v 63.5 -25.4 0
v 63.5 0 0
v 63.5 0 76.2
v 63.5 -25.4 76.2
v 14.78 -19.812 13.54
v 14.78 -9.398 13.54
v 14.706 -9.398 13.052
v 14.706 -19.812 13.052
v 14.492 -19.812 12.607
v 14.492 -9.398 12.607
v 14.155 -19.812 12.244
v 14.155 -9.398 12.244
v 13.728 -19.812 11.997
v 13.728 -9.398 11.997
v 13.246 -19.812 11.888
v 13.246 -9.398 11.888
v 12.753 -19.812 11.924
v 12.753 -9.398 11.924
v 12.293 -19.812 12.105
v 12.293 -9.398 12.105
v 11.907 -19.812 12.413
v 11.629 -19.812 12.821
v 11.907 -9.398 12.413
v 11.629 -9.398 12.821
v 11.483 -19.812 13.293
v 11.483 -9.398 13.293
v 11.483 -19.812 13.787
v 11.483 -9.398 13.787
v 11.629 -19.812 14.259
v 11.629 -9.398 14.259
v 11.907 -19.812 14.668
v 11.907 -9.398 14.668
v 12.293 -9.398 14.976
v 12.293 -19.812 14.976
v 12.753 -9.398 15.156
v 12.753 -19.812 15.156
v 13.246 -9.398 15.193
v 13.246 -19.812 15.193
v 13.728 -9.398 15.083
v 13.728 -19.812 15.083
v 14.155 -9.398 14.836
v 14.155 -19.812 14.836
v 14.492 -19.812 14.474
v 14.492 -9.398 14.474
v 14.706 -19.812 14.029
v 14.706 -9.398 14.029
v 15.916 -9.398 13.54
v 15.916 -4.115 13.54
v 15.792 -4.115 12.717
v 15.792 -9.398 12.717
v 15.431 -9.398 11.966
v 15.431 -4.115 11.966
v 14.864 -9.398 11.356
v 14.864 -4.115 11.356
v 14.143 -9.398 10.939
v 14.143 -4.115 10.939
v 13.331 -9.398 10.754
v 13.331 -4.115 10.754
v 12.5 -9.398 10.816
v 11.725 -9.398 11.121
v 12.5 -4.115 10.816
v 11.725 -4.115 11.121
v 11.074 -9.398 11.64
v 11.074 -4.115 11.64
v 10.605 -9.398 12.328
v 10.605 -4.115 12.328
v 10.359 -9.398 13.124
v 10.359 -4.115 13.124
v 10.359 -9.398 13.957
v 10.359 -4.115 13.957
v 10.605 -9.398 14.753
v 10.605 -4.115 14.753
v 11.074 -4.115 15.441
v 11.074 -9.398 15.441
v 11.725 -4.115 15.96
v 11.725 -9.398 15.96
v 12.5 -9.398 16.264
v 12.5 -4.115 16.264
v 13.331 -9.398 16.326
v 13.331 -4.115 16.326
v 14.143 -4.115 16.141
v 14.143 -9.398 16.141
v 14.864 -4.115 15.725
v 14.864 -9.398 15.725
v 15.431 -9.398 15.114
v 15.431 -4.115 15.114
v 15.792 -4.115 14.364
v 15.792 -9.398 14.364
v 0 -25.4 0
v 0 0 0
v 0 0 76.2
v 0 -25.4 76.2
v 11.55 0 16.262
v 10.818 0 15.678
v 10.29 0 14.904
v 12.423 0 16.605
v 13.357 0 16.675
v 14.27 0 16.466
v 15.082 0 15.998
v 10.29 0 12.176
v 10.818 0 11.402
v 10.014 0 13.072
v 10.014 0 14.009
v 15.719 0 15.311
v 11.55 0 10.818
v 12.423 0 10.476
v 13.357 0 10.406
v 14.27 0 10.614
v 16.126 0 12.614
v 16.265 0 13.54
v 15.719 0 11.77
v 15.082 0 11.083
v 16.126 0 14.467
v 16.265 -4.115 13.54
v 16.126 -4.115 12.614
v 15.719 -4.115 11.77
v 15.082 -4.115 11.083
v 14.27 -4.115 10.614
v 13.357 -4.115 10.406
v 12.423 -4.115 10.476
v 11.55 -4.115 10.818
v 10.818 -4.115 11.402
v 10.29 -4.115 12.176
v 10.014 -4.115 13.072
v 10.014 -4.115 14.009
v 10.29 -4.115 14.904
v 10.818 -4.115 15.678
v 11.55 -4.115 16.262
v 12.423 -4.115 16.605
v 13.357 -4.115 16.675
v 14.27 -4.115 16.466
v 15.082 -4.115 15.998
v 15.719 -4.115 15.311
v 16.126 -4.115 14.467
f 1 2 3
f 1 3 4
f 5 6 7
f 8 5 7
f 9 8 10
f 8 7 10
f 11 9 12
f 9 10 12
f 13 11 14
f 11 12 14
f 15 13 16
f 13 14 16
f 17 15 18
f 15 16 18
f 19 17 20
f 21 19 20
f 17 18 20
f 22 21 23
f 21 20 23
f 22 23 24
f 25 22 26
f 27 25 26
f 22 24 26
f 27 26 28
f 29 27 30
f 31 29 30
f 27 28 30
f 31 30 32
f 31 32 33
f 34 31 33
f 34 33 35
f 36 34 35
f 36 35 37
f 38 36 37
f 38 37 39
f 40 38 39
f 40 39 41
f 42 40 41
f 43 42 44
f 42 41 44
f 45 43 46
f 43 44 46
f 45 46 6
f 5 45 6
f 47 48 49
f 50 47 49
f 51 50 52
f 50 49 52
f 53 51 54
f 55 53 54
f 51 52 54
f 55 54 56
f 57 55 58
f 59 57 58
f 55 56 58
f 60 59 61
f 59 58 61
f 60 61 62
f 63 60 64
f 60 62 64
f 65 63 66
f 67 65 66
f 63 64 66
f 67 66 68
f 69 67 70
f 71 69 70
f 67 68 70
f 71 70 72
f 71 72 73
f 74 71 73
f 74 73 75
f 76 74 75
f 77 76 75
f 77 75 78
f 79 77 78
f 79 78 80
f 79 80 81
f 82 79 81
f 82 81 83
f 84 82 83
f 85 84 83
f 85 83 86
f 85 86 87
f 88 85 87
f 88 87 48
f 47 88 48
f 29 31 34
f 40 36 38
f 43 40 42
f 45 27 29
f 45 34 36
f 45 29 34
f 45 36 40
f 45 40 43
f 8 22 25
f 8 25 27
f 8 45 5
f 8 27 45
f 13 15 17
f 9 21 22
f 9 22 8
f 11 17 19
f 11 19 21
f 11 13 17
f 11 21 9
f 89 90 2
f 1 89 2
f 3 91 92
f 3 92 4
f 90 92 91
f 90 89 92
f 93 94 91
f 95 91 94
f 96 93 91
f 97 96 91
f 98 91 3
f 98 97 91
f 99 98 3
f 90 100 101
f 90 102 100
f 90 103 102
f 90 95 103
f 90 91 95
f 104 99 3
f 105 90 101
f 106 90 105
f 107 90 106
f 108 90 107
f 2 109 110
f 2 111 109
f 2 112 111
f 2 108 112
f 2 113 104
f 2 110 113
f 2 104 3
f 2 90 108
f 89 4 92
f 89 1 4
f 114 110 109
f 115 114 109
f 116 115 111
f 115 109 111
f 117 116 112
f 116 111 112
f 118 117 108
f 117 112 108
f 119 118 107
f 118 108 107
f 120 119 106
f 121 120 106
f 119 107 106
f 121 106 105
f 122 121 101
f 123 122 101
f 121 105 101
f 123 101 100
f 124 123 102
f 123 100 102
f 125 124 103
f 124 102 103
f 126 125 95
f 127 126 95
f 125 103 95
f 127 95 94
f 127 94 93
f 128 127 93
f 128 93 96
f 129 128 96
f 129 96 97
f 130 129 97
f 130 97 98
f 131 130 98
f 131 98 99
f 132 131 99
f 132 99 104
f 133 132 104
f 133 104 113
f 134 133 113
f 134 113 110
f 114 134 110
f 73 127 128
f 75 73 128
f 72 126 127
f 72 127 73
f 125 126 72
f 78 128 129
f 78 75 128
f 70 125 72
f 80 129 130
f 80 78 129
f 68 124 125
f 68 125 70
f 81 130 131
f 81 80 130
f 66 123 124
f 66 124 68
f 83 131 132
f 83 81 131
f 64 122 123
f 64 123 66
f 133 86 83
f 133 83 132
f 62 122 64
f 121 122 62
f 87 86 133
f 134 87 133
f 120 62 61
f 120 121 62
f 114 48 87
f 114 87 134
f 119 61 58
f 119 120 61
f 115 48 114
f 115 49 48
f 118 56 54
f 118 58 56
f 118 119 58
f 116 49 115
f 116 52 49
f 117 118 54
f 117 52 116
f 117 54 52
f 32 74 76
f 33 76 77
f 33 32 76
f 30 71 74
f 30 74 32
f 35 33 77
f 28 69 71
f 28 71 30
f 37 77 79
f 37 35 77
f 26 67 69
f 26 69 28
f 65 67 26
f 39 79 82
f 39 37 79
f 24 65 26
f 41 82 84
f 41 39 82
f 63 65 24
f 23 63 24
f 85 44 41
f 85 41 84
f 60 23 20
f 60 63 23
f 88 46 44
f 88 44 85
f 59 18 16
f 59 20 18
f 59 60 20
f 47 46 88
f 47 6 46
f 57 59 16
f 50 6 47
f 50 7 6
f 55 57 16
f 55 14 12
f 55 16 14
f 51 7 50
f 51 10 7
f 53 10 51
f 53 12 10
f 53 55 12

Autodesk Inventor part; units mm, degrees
ref_plane "YZ Plane" through (0, 0, 0) normal (1, 0, 0) x (0, 1, 0)
ref_plane "XZ Plane" through (0, 0, 0) normal (0, 1, 0) x (-1, 0, 0)
ref_plane "XY Plane" through (0, 0, 0) normal (0, 0, 1) x (1, 0, 0)
sketch "Sketch1" plane through (0, 0, 0) normal (0, 0, 1) x (1, 0, 0)
  line L0 (0, 0) -> (63.5, 0)
  line L1 (63.5, 0) -> (63.5, -25.4)
  line L2 (63.5, -25.4) -> (0, -25.4)
  line L3 (0, -25.4) -> (0, 0)
  dimension "d0" = 63.5
  dimension "d1" = 25.4
extrude "Extrusion1" add sketch "Sketch1" along normal blind 76.2
sketch "Sketch2" plane through (0, 0, 0) normal (0, 1, 0) x (1, 0, 0)
  circle A0 centre (13.1221, -13.5403) radius 1.6574
  circle A1 centre (13.1221, -13.5403) radius 3.1433
  circle A2 centre (13.1221, -13.5403) radius 2.794
  point P0 (0, 0)
  point P1 (22.0121, -13.5403)
  point P2 (35.874, -13.5403)
  point P3 (13.1221, -22.4303)
  point P4 (22.0121, -22.4303)
  point P5 (13.1221, -22.4303)
  dimension "d4" = 3.3147
  dimension "d5" = 6.2865
  dimension "d6" = 5.588
  dimension "d22" = 8.89
  dimension "d23" = 8.89
  dimension "d24" = 8.89
extrude "Extrusion2" cut sketch "Sketch2" against normal blind 19.812 contours A0
extrude "Extrusion3" cut sketch "Sketch2" against normal blind 9.398 contours A2
extrude "Extrusion4" cut sketch "Sketch2" against normal blind 4.1148 contours A1
fillet "Fillet1" [suppressed]
loft "Loft1" [suppressed]
properties part number "Thermocyler_Block_Test"
